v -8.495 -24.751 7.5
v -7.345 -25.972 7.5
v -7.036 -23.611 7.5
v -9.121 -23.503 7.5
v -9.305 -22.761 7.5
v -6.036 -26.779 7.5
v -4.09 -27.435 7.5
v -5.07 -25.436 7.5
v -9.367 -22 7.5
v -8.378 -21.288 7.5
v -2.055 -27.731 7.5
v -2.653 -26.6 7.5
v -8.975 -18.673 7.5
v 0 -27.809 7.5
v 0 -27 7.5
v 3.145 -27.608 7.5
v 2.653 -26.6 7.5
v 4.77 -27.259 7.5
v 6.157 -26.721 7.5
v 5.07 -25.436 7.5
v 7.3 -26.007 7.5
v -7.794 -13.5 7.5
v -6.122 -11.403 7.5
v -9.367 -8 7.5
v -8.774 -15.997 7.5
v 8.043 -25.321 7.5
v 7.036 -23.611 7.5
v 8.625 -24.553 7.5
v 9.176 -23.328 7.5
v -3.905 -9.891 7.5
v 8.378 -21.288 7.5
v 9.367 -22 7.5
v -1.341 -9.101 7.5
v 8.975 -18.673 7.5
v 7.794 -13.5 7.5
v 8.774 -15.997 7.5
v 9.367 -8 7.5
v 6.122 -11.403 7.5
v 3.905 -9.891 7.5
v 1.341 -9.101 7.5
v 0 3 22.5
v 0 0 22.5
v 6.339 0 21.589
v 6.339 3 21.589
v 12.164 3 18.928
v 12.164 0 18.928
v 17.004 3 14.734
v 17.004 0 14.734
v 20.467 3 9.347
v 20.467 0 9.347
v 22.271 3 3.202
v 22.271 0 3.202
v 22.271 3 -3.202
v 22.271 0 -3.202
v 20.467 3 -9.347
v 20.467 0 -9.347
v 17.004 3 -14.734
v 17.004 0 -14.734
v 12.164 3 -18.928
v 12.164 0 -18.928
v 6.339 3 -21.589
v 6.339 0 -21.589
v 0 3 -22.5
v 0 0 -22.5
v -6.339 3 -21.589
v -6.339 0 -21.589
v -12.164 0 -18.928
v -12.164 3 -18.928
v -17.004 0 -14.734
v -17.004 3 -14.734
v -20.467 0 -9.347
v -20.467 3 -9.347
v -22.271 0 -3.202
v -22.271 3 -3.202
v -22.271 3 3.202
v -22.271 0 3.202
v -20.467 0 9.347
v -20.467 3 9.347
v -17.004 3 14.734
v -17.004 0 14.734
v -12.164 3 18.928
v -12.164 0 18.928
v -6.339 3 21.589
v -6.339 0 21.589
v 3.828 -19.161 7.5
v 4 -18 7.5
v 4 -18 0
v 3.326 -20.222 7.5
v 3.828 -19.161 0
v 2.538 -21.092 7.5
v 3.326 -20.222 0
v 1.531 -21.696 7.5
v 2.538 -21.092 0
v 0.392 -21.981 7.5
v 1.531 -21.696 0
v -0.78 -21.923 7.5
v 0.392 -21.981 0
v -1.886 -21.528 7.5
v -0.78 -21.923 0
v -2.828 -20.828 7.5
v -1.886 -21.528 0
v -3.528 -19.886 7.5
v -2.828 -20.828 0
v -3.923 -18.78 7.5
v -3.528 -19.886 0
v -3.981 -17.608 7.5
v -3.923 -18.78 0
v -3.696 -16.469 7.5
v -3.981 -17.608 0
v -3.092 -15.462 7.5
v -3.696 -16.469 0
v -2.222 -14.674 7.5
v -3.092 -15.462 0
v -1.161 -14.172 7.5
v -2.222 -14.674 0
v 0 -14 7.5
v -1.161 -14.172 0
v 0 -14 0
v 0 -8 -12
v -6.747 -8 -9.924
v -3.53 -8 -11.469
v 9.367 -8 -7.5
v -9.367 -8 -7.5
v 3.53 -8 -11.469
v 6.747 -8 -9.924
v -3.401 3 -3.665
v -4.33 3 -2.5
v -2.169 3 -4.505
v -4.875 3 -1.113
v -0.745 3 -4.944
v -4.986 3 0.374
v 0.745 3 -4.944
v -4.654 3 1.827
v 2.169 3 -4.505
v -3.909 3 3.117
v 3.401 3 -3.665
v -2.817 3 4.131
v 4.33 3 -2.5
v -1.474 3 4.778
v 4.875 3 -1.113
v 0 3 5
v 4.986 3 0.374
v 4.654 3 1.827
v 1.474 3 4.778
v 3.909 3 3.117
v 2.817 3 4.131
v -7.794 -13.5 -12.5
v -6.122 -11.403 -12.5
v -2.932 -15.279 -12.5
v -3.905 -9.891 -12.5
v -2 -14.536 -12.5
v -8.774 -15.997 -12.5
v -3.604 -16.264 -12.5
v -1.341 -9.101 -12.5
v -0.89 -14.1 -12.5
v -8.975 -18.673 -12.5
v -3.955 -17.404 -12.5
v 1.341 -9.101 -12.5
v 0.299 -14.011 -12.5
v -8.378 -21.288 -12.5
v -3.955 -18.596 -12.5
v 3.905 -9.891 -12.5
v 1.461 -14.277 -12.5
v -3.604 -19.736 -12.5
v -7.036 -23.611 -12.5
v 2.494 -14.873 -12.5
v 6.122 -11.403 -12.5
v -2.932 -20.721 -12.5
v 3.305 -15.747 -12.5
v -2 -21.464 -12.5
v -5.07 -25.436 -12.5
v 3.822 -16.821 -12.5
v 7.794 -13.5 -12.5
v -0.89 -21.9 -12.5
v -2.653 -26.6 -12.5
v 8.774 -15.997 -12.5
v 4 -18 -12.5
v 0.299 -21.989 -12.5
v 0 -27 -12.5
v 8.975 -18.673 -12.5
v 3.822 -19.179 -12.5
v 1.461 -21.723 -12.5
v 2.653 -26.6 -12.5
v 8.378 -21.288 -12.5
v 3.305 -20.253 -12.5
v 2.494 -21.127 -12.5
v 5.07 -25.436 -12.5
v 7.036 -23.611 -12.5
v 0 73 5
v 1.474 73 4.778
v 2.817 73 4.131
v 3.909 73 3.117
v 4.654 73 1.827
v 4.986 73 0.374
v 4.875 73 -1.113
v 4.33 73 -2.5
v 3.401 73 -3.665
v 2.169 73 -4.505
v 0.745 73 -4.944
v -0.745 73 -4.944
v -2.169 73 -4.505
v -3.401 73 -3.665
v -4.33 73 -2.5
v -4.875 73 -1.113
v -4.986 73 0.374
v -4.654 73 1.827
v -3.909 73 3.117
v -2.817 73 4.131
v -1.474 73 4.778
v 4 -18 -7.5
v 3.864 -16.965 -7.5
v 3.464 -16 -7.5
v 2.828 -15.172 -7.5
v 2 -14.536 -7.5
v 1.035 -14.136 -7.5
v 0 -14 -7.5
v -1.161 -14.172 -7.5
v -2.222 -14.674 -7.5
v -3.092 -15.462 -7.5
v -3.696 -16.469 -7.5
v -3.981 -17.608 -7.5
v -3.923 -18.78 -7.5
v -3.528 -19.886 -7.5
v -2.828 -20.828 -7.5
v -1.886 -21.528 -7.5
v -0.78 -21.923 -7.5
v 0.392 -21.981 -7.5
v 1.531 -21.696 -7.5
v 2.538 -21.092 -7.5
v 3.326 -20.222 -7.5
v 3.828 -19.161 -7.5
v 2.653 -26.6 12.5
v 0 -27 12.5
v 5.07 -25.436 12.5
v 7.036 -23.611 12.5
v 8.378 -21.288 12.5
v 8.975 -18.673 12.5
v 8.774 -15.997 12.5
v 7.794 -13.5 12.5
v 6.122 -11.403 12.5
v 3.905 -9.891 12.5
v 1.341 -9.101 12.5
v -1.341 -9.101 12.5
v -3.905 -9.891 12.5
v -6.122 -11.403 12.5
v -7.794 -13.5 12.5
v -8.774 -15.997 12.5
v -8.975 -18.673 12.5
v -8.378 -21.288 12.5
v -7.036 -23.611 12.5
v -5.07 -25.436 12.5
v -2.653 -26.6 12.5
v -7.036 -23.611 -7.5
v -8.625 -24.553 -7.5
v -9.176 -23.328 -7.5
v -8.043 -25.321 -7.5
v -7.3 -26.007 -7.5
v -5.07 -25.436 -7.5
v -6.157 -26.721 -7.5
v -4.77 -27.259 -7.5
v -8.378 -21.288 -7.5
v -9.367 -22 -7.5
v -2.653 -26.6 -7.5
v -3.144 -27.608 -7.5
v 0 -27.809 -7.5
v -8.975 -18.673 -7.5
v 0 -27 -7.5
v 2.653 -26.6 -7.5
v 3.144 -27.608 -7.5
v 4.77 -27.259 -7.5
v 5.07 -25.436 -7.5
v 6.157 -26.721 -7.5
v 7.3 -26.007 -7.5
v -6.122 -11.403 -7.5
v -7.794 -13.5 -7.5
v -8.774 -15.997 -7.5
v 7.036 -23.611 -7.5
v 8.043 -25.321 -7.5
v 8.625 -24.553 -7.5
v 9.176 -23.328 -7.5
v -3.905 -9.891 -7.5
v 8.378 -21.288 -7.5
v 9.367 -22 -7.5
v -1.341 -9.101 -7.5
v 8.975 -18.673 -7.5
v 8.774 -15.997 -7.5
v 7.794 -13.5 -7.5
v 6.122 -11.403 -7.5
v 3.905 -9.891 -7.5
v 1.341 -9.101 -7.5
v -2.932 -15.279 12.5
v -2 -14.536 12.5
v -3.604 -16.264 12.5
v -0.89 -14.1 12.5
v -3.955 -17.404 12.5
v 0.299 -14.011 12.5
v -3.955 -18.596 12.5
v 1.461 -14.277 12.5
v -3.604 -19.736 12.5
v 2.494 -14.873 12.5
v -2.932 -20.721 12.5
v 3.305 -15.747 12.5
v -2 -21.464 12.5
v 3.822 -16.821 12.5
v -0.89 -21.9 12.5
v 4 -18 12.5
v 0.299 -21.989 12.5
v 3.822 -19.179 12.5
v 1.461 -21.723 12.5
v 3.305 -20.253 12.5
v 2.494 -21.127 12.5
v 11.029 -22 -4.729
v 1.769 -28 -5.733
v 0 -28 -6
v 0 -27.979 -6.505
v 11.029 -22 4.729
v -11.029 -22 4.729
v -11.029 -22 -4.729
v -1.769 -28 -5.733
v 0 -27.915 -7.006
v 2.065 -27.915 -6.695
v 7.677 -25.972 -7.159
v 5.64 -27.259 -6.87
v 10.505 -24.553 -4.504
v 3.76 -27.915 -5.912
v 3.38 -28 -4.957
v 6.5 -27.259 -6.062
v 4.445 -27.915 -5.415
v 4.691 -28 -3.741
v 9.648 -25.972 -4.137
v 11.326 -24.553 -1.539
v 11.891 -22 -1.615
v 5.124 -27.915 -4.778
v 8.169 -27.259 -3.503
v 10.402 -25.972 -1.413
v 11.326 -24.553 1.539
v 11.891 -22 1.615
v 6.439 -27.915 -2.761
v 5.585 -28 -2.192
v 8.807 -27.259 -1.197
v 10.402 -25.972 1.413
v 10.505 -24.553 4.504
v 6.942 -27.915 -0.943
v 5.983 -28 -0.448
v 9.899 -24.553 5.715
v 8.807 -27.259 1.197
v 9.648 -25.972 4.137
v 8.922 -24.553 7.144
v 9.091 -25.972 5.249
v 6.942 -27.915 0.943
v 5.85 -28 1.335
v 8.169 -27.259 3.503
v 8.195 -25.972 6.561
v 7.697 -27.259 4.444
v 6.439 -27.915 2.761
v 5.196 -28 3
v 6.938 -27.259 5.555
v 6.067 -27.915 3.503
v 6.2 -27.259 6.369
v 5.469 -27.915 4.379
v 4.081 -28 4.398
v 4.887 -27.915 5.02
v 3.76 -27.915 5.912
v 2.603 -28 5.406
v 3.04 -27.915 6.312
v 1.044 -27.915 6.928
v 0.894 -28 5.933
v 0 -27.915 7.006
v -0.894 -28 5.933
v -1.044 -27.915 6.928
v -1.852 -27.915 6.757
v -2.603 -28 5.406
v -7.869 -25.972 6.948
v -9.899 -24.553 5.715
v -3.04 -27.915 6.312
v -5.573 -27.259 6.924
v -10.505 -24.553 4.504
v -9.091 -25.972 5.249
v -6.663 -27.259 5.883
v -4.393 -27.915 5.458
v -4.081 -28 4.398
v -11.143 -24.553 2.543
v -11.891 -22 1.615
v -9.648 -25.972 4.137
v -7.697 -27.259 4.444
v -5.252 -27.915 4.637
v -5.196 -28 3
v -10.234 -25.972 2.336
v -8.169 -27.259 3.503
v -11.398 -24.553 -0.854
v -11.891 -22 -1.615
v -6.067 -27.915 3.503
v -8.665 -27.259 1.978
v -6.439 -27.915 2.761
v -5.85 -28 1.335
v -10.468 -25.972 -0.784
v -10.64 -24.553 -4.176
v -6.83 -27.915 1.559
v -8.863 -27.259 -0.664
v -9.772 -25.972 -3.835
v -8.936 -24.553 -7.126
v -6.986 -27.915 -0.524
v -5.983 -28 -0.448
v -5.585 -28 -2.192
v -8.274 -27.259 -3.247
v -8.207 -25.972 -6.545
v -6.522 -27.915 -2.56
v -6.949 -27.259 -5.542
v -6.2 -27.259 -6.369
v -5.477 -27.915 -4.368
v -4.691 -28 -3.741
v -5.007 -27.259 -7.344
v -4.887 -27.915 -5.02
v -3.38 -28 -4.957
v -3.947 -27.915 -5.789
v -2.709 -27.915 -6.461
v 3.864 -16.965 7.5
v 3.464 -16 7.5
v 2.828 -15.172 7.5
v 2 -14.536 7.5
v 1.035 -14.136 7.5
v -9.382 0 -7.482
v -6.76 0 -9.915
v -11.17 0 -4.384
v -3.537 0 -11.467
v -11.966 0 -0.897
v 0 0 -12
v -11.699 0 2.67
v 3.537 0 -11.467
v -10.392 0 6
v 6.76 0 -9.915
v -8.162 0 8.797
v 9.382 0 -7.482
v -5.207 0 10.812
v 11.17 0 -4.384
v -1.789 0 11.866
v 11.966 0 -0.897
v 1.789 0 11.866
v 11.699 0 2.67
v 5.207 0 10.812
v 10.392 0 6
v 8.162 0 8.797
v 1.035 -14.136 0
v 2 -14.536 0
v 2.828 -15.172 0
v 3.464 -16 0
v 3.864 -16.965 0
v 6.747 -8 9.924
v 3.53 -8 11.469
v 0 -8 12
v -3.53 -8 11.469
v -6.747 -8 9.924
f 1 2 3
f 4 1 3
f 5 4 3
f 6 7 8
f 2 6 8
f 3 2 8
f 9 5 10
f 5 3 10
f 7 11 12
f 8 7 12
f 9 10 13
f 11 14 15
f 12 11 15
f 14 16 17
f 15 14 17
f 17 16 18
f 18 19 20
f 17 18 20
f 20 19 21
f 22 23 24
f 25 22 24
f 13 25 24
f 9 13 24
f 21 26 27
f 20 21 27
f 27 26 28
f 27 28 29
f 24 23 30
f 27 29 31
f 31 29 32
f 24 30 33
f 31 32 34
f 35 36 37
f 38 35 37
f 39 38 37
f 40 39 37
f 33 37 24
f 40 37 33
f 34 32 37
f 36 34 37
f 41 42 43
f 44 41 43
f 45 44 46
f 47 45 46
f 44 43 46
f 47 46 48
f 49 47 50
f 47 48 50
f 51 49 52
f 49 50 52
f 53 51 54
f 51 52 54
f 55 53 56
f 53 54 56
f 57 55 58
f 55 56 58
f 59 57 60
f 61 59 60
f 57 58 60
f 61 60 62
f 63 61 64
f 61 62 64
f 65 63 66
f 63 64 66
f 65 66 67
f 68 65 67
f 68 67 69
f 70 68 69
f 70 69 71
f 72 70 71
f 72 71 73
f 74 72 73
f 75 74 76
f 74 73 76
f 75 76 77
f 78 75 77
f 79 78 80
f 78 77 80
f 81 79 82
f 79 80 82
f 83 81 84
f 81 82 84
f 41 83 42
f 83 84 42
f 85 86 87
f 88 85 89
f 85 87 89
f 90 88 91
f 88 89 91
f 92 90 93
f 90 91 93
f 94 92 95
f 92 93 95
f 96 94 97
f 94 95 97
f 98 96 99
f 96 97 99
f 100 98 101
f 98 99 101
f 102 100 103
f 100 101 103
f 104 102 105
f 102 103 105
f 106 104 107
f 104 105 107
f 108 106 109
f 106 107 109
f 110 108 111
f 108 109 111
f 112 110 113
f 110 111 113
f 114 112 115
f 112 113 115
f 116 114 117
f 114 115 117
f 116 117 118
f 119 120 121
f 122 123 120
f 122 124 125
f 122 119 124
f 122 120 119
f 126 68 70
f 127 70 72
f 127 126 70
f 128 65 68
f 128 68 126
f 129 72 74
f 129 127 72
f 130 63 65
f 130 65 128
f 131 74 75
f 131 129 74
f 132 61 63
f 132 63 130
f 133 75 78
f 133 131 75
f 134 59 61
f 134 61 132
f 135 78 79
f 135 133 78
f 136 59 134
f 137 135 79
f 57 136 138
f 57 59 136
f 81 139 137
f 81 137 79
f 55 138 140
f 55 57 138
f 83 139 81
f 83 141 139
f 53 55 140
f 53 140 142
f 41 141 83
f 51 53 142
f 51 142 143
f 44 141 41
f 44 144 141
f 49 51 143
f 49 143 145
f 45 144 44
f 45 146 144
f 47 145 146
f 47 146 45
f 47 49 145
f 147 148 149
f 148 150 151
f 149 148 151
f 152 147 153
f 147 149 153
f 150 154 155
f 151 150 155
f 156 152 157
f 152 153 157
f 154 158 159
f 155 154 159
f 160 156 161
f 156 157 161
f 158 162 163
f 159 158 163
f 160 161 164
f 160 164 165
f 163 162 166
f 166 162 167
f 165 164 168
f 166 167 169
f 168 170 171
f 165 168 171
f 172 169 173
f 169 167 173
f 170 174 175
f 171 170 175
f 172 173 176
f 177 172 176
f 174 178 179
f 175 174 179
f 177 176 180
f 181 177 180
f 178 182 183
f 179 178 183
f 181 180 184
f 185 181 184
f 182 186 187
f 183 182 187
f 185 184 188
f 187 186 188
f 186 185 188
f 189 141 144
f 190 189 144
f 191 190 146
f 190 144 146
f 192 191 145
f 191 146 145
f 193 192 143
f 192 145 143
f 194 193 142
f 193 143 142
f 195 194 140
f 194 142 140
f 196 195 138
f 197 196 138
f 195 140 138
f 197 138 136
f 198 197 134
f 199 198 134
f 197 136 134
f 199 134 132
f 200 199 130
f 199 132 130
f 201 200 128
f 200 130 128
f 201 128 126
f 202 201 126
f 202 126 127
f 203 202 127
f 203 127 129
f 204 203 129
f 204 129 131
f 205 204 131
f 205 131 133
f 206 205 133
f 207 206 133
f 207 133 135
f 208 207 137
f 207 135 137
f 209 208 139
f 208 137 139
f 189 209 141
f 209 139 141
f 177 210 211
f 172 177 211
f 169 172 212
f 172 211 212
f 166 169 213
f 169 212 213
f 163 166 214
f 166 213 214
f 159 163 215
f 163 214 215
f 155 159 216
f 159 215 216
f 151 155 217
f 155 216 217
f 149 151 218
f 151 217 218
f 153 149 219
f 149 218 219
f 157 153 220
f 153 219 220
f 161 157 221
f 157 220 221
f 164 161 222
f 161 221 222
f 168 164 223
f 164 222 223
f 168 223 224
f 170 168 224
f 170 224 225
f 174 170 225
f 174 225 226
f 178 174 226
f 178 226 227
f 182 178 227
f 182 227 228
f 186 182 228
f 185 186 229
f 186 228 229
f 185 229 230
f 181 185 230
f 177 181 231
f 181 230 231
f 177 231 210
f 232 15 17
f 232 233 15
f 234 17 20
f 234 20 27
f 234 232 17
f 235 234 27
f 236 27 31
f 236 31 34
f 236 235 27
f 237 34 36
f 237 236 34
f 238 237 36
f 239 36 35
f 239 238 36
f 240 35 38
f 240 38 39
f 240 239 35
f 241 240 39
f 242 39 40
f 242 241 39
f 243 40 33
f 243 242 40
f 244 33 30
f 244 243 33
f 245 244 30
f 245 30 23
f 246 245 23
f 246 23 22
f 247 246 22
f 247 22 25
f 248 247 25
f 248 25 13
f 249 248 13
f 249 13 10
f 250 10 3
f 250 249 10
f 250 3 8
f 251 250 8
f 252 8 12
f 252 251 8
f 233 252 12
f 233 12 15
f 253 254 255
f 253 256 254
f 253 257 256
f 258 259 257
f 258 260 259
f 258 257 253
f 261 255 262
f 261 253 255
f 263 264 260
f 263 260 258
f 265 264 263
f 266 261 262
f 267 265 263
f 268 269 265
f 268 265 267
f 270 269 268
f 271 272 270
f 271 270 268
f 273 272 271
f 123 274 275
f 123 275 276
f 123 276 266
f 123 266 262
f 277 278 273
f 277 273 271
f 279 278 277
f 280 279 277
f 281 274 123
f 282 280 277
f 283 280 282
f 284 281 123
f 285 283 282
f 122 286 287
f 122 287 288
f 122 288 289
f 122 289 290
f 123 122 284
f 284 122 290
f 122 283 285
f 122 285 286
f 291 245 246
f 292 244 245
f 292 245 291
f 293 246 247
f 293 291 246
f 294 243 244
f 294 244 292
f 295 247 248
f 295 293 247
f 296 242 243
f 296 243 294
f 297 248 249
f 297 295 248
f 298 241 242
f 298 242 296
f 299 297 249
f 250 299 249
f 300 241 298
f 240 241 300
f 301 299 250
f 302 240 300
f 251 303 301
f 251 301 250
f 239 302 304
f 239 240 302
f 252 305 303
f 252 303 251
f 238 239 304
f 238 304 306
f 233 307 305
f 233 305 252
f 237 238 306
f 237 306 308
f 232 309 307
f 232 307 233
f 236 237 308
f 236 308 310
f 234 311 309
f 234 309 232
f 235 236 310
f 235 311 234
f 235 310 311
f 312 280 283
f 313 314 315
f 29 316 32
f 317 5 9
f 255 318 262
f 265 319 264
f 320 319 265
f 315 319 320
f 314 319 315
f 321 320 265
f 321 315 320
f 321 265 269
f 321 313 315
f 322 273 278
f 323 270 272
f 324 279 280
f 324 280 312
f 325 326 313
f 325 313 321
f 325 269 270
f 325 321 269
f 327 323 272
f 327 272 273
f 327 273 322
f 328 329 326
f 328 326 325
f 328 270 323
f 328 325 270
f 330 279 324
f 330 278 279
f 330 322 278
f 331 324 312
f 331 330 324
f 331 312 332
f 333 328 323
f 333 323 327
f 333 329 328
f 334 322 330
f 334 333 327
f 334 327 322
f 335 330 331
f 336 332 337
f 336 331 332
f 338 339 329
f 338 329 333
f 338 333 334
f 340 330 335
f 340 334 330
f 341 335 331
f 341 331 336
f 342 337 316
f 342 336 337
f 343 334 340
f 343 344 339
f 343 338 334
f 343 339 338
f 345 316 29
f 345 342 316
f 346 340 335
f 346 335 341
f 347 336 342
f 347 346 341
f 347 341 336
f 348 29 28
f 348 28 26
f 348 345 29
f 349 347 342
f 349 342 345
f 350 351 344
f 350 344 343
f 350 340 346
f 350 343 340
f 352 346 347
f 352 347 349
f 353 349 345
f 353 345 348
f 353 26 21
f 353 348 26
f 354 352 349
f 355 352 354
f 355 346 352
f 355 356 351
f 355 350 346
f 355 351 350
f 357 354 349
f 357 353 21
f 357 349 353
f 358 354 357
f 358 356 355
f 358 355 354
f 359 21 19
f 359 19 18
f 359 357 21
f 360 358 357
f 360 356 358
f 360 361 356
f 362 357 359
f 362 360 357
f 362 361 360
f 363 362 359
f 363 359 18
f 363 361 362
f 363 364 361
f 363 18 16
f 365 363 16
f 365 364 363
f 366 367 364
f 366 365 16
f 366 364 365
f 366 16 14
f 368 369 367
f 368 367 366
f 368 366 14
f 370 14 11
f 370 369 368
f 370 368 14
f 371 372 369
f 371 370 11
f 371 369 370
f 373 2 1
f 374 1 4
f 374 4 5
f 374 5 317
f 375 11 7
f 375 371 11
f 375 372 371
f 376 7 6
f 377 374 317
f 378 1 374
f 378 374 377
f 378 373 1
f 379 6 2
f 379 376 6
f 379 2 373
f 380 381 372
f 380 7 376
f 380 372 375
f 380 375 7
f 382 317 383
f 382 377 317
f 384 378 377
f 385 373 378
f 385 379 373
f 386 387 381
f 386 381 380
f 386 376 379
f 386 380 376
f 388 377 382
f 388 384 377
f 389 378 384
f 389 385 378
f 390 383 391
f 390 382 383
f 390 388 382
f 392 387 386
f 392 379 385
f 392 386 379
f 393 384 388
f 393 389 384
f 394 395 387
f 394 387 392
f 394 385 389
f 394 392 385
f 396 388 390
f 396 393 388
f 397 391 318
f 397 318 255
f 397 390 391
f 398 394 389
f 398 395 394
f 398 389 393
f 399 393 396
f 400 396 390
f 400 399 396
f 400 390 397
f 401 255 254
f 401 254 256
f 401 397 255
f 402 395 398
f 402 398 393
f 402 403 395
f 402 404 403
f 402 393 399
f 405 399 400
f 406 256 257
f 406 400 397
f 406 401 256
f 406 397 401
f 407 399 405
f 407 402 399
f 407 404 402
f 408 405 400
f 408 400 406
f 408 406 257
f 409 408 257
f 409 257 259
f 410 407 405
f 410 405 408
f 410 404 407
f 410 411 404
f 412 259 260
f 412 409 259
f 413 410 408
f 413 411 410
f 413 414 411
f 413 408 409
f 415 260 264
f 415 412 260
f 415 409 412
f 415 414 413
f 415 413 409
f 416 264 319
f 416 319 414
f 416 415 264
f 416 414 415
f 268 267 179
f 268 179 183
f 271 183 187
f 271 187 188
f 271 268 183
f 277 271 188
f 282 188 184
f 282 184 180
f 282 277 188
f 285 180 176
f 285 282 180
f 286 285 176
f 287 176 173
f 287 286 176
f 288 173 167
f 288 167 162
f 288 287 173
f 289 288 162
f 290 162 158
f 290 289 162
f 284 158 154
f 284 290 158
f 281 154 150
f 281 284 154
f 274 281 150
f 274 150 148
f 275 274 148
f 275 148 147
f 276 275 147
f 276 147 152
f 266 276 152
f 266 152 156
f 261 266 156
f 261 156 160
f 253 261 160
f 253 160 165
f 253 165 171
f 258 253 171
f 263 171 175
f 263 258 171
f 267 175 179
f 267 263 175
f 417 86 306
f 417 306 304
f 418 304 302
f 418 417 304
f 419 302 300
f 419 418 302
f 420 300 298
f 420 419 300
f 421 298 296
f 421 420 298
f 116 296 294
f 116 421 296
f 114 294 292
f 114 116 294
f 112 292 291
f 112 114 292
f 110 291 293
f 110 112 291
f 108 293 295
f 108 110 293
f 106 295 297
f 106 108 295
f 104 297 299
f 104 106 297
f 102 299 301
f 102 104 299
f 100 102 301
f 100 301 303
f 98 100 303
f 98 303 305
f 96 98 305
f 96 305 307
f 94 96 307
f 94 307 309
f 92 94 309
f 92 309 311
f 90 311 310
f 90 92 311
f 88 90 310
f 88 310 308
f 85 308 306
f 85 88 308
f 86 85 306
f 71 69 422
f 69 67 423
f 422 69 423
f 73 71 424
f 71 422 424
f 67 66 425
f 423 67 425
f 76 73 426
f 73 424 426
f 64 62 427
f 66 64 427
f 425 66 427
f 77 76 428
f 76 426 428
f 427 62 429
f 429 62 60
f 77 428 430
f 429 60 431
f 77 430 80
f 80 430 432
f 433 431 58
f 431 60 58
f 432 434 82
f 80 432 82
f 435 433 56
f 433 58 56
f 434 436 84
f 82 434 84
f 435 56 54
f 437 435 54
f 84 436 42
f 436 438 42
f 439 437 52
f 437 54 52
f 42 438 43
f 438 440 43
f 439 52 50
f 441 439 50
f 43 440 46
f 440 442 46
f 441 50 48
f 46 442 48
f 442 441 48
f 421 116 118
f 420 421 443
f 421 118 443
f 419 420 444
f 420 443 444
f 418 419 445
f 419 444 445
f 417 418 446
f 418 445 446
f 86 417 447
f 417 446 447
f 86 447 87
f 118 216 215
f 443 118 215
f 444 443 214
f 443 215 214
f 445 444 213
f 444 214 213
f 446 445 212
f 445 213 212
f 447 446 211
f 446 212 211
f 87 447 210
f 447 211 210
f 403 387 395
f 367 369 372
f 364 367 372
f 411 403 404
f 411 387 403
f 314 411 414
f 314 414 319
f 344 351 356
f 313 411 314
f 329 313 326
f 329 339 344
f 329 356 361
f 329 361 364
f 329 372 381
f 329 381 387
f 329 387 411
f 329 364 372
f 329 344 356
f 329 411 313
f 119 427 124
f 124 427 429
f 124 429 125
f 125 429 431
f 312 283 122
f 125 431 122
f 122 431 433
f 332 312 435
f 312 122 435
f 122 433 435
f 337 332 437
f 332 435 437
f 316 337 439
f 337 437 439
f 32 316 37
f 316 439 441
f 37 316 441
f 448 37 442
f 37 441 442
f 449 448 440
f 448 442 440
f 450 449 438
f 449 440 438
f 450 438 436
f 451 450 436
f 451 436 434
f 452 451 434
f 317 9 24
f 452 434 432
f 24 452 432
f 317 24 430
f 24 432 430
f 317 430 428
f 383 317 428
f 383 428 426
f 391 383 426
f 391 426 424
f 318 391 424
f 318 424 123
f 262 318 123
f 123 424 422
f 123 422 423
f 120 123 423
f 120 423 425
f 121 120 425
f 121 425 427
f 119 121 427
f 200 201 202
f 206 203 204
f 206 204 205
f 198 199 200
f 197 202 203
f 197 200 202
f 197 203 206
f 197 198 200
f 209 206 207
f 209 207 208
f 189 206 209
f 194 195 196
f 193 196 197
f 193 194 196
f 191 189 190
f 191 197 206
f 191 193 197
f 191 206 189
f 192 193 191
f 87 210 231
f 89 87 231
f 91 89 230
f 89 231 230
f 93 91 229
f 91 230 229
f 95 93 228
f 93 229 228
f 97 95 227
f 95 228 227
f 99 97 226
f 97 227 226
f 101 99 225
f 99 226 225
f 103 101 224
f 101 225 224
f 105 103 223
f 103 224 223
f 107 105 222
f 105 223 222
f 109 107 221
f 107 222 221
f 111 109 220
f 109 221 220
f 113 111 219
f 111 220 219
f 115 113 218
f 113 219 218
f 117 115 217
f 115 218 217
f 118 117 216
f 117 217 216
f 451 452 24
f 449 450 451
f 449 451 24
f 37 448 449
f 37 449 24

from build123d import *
from build123d.topology import SkipClean

# Parameters (mm, degrees)
SKETCH1_R               = 22.5
BOSS_EXTRUDE1_DEPTH     = 3
SKETCH2_R               = 5
BOSS_EXTRUDE2_DEPTH     = 70
SKETCH3_R               = 12
BOSS_EXTRUDE3_DEPTH     = 28
FILLET1_R               = 6
SKETCH4_W               = 13.909985693
SKETCH4_H               = 20
CUT_EXTRUDE1_DEPTH      = 80.633535649
CUT_EXTRUDE1_DEPTH_BACK = 80.633535649
SKETCH8_R               = 4
CUT_EXTRUDE3_DEPTH      = 83.068568892
SKETCH10_R              = 9
SKETCH10_R_2            = 4
BOSS_EXTRUDE5_DEPTH     = 12.5


with BuildPart() as part:
    # Sketch1 → Boss-Extrude1 (new body)
    with BuildSketch(Plane(origin=(0, 0, 0), x_dir=(1, 0, 0), z_dir=(0, 1, 0))):
        with Locations(Location((0, 0, 0), (0, 0, 270))):
            Circle(SKETCH1_R)
    extrude(amount=BOSS_EXTRUDE1_DEPTH)

    # Sketch2 → Boss-Extrude2 (add)
    with BuildSketch(Plane(origin=(0, 3, 0), x_dir=(1, 0, 0), z_dir=(0, 1, 0))):
        with Locations(Location((0, 0, 0), (0, 0, 270))):
            Circle(SKETCH2_R)
    extrude(amount=BOSS_EXTRUDE2_DEPTH)

    # Sketch3 → Boss-Extrude3 (add)
    with BuildSketch(Plane.XZ):
        with Locations(Location((0, 0, 0), (0, 0, 270))):
            Circle(SKETCH3_R)
    extrude(amount=BOSS_EXTRUDE3_DEPTH)

    # Fillet1
    fillet1_edges = [part.edges().sort_by_distance(p)[0] for p in [
        (0, -28, 12),
    ]]
    fillet(fillet1_edges, radius=FILLET1_R)

    # Sketch4 → Cut-Extrude1 (cut, two sides)
    with BuildSketch(Plane(origin=(0, 0, 0), x_dir=(0, 0, -1), z_dir=(1, 0, 0))) as cut_extrude1_sk:
        with Locations((14.454992847, -18)):
            Rectangle(SKETCH4_W, SKETCH4_H)
        with Locations((-14.454992847, -18)):
            Rectangle(SKETCH4_W, SKETCH4_H)
    extrude(amount=CUT_EXTRUDE1_DEPTH, mode=Mode.SUBTRACT)
    extrude(cut_extrude1_sk.sketch, amount=-CUT_EXTRUDE1_DEPTH_BACK, mode=Mode.SUBTRACT)

    # Sketch8 → Cut-Extrude3 (cut, through all)
    with BuildSketch(Plane(origin=(0, 0, -7.5), x_dir=(-1, 0, 0), z_dir=(0, 0, -1))):
        with Locations(Location((0, -18, 0), (0, 0, 90))):
            Circle(SKETCH8_R)
    extrude(amount=-CUT_EXTRUDE3_DEPTH, mode=Mode.SUBTRACT)

    # Sketch10 → Boss-Extrude5 (add, symmetric)
    with SkipClean():  # the faces are left unmerged after this step: merging them gives an invalid solid
        with BuildSketch(Plane.XY):
            with Locations(Location((0, -18, 0), (0, 0, 270))):
                Circle(SKETCH10_R)
            with Locations((0, -18)):
                Circle(SKETCH10_R_2, mode=Mode.SUBTRACT)
        extrude(amount=BOSS_EXTRUDE5_DEPTH, both=True)


solid = part.part
